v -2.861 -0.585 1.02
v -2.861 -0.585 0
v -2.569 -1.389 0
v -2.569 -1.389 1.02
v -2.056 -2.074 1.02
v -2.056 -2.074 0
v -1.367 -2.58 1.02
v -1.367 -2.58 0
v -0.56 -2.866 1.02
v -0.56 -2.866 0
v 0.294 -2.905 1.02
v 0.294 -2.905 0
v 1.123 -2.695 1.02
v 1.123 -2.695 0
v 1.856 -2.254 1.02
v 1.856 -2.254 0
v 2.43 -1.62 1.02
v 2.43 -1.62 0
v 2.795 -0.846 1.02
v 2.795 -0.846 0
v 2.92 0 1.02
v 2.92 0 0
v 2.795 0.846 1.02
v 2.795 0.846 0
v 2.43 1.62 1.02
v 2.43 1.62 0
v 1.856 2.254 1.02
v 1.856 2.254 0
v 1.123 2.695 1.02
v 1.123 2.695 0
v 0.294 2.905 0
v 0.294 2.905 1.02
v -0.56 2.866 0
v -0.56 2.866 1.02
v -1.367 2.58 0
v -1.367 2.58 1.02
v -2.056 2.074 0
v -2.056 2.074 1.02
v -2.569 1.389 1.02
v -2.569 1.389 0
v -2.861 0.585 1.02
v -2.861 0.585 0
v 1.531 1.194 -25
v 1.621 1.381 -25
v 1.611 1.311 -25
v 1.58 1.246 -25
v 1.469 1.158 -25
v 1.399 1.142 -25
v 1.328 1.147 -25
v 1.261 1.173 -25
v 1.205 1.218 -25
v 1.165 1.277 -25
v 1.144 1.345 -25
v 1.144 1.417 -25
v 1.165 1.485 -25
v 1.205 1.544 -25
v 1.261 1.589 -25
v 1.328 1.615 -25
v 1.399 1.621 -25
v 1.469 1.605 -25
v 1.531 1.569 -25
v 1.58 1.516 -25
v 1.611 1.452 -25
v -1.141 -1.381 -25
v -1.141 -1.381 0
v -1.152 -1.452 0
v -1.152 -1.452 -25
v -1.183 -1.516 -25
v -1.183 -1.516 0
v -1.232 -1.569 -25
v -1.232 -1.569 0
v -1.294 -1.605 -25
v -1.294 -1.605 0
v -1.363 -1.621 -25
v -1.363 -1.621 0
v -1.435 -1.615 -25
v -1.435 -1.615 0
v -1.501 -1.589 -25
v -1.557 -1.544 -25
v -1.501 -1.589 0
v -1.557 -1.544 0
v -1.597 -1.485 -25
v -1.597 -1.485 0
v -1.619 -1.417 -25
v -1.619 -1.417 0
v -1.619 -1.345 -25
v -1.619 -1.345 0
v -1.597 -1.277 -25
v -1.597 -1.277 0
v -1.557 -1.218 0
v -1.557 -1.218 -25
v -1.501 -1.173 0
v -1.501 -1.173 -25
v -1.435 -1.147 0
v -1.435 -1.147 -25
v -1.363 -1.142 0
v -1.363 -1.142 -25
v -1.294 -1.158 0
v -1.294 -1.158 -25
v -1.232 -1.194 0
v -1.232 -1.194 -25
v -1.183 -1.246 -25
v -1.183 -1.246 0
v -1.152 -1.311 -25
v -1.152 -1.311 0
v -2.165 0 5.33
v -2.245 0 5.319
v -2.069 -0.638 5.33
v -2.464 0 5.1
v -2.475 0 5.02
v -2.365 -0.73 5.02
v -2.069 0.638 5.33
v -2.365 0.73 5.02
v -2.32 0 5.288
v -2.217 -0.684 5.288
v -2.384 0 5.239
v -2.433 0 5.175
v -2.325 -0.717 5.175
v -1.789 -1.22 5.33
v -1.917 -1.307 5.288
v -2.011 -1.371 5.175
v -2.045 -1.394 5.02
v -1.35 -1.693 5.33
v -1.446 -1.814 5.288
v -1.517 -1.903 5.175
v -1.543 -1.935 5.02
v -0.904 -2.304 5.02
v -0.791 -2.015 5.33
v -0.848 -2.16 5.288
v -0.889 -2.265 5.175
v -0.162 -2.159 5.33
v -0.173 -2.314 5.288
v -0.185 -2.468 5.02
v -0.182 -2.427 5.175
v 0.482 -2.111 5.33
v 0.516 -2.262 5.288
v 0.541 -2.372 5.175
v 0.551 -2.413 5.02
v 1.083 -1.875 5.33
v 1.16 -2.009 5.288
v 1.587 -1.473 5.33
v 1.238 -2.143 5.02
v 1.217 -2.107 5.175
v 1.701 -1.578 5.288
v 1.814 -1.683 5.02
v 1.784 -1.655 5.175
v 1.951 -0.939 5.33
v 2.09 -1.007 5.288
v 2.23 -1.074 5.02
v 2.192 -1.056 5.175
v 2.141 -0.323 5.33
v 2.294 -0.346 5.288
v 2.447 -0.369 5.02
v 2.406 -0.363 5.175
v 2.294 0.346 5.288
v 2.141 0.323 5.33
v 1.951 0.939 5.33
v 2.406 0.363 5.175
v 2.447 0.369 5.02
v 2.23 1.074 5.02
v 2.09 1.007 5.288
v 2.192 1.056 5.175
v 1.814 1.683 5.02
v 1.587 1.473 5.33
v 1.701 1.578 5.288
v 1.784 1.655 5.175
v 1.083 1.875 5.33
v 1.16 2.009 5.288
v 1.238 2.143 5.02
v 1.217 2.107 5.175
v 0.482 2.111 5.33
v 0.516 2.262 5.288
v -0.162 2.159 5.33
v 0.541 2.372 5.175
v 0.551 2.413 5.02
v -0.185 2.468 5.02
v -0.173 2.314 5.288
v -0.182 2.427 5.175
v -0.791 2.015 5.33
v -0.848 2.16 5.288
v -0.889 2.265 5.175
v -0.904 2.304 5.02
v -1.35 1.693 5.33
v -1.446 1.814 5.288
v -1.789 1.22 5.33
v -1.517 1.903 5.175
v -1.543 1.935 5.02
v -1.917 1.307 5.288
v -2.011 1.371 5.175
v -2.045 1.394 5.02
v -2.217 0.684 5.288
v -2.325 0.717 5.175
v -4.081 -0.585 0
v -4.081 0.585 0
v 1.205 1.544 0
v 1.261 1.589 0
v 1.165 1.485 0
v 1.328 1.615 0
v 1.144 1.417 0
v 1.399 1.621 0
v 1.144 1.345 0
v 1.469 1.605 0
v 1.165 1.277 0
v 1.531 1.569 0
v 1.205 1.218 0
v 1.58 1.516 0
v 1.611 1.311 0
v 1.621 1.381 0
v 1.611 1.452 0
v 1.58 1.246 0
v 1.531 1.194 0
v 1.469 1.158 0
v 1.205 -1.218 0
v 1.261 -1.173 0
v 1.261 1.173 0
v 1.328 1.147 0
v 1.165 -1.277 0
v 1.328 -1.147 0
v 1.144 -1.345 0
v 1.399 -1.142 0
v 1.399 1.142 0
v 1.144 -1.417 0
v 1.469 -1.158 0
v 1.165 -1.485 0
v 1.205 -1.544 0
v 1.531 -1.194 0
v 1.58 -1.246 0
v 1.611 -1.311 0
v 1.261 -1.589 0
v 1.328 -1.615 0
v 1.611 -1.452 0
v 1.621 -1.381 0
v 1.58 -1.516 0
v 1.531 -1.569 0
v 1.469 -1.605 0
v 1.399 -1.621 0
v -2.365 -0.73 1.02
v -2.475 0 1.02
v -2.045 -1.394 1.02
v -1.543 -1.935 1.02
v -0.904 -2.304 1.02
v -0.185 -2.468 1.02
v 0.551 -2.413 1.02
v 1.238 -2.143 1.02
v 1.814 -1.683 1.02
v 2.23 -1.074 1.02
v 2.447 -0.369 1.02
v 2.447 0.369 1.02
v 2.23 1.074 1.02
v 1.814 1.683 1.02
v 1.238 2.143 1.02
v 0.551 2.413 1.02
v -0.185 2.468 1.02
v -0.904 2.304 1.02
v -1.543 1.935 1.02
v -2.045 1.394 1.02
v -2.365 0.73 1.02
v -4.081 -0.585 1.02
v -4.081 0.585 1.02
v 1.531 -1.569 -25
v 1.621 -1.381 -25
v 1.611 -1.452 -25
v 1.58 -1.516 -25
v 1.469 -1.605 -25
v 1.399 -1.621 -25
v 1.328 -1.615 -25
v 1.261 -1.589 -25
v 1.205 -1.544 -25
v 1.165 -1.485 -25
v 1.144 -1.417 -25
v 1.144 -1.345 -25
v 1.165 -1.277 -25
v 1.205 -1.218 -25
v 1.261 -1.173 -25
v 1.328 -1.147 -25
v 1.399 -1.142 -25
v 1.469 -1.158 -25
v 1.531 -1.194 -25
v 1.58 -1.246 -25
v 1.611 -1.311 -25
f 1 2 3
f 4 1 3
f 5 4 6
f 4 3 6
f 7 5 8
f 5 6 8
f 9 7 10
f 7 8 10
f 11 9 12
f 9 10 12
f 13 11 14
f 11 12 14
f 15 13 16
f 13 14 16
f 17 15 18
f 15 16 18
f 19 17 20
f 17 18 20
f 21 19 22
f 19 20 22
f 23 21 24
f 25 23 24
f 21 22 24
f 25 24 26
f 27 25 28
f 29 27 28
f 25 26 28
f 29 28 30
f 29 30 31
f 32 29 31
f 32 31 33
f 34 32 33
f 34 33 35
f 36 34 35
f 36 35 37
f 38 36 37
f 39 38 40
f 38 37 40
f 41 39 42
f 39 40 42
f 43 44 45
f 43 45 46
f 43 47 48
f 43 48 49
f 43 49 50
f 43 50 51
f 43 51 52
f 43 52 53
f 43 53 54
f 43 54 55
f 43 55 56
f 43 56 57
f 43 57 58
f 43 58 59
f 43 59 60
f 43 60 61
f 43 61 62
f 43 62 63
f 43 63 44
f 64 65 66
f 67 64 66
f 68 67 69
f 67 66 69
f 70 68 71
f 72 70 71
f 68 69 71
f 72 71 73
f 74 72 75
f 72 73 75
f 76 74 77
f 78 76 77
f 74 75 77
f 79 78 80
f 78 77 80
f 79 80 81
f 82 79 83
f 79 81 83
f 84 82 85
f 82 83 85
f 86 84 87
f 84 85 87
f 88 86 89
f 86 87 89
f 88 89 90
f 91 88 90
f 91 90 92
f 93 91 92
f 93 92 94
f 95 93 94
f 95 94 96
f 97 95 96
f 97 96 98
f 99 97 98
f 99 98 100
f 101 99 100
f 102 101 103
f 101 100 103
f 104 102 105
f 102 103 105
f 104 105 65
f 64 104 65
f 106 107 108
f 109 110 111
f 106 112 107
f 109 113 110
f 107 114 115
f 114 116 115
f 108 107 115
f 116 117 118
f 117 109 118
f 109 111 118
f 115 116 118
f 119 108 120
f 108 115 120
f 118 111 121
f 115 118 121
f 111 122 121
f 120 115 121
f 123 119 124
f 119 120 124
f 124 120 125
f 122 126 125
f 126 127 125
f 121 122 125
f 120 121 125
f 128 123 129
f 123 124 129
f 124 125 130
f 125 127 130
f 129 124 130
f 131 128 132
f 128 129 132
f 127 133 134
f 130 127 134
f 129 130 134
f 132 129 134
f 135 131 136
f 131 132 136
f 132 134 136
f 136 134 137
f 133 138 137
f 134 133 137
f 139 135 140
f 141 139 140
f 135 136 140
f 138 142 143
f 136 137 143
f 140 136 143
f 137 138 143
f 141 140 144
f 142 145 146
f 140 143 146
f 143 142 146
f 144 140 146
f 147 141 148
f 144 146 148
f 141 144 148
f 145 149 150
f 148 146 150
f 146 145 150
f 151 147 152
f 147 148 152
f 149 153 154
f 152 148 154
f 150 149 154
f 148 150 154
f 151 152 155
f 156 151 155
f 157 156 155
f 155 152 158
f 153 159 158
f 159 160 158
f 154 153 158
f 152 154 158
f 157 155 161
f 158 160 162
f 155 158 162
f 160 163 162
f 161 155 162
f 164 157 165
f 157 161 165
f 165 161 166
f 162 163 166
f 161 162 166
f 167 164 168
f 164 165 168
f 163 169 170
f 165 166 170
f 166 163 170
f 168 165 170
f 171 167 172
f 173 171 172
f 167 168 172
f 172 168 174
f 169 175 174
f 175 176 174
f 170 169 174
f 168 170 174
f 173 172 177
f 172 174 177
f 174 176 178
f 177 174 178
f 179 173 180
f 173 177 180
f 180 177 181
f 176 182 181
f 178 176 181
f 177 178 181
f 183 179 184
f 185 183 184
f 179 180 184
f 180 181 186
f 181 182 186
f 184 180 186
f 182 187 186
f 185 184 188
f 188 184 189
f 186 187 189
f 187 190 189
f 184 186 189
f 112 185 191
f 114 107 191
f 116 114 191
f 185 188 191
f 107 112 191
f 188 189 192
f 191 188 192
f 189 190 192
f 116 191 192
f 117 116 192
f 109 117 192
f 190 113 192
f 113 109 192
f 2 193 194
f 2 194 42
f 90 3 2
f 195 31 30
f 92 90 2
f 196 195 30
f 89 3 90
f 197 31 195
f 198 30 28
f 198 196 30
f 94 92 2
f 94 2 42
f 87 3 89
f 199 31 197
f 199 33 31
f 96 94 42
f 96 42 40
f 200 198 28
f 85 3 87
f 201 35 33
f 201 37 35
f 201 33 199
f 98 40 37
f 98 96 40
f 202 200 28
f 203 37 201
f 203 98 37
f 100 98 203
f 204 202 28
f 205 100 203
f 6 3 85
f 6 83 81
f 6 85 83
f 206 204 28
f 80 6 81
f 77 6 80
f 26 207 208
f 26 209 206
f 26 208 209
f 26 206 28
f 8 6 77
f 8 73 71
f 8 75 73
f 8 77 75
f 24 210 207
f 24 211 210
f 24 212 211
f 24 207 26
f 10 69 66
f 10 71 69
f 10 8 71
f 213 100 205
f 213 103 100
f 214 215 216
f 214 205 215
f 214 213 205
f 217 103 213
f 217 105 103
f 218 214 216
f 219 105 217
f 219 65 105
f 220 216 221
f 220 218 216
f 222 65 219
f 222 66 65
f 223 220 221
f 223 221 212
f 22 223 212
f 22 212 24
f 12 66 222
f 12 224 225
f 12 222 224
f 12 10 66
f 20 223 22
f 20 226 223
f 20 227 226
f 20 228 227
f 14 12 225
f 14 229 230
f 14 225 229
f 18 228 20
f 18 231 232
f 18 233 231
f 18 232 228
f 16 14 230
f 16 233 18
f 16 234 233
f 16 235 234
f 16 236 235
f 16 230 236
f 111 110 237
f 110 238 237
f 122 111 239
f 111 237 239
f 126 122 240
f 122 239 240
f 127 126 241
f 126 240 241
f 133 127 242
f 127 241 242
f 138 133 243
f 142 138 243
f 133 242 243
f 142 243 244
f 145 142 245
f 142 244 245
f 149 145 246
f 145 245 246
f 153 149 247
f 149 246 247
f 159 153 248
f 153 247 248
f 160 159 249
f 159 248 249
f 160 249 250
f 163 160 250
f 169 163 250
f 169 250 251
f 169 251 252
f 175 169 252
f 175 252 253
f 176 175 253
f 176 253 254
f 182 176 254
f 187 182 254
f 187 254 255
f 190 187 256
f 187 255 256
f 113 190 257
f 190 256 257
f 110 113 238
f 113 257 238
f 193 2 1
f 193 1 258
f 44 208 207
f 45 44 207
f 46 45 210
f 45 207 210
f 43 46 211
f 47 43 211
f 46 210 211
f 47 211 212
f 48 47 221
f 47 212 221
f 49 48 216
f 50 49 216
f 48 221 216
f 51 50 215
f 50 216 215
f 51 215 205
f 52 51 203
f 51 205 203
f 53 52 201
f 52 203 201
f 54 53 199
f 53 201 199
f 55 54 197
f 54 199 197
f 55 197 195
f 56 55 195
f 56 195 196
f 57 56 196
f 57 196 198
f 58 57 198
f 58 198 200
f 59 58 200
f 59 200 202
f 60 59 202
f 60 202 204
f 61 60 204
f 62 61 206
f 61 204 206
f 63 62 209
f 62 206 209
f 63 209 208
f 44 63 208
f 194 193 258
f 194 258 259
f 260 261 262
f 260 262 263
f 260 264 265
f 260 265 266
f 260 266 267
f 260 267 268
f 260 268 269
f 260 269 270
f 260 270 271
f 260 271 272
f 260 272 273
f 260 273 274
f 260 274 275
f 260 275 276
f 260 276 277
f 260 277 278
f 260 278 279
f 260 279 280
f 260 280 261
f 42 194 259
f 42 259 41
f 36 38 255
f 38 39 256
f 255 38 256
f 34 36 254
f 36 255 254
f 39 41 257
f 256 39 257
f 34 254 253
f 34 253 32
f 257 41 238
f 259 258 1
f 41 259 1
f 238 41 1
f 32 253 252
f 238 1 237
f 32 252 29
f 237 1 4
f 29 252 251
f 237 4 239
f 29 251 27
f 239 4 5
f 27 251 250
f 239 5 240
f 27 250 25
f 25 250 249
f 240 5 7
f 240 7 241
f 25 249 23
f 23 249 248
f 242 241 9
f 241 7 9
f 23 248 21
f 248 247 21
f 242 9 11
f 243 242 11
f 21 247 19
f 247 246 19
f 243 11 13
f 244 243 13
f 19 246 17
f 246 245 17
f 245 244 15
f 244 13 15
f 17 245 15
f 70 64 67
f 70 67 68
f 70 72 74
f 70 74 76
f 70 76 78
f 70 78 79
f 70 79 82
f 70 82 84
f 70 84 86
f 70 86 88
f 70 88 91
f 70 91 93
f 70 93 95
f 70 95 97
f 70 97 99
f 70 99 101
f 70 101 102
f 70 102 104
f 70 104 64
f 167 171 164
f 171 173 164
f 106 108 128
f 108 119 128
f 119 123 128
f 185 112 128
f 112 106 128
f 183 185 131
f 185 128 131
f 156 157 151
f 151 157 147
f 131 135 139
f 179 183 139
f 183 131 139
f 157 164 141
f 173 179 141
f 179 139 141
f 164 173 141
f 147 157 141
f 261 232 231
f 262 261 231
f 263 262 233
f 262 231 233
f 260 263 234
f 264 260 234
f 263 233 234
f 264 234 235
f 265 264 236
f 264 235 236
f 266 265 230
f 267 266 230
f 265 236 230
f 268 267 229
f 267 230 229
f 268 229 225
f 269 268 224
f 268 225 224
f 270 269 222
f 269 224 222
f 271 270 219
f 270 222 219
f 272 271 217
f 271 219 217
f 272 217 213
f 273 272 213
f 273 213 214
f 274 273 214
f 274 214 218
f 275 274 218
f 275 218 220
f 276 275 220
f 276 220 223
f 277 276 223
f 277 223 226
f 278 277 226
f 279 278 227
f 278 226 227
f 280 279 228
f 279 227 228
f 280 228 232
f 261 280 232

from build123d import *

# Parameters (mm, degrees)
F3_DEPTH = 1.02
F2_R     = 0.24
F4_DEPTH = 25


with BuildPart() as f1:
    # F0 (on Front) → F1 (revolve)
    with BuildSketch(Plane.XZ):
        with BuildLine():
            Line((0, 0), (0, 5.33))
            Line((0, 5.33), (-2.165, 5.33))
            ThreePointArc((-2.165, 5.33), (-2.384203, 5.239203), (-2.475, 5.02))
            Line((-2.475, 5.02), (-2.475, 1.02))
            Line((-2.475, 1.02), (-2.92, 1.02))
            Line((-2.92, 1.02), (-2.92, 0))
            Line((-2.92, 0), (0, 0))
        make_face()
    revolve(axis=Axis((0, 0, 2.665), (0, 0, 1)))

    # F2 (on face) → F3 (join)
    with BuildSketch(Plane(origin=(0, 0, 0), x_dir=(1, 0, 0), z_dir=(0, 0, -1))):
        with BuildLine():
            ThreePointArc((-2.8608, -0.585), (-2.92, 0), (-2.8608, 0.585))
            Line((-2.8608, 0.585), (-4.0808, 0.585))
            Line((-4.0808, 0.585), (-4.0808, -0.585))
            Line((-4.0808, -0.585), (-2.8608, -0.585))
        make_face()
    extrude(amount=-F3_DEPTH)

    # F2 (on face) → F4 (join)
    with BuildSketch(Plane(origin=(0, 0, 0), x_dir=(1, 0, 0), z_dir=(0, 0, -1))):
        with Locations((-1.38125, 1.38125)):
            Circle(F2_R)
        with Locations((1.38125, 1.38125)):
            Circle(F2_R)
        with Locations((1.38125, -1.38125)):
            Circle(F2_R)
    extrude(amount=F4_DEPTH)


solid = f1.part
